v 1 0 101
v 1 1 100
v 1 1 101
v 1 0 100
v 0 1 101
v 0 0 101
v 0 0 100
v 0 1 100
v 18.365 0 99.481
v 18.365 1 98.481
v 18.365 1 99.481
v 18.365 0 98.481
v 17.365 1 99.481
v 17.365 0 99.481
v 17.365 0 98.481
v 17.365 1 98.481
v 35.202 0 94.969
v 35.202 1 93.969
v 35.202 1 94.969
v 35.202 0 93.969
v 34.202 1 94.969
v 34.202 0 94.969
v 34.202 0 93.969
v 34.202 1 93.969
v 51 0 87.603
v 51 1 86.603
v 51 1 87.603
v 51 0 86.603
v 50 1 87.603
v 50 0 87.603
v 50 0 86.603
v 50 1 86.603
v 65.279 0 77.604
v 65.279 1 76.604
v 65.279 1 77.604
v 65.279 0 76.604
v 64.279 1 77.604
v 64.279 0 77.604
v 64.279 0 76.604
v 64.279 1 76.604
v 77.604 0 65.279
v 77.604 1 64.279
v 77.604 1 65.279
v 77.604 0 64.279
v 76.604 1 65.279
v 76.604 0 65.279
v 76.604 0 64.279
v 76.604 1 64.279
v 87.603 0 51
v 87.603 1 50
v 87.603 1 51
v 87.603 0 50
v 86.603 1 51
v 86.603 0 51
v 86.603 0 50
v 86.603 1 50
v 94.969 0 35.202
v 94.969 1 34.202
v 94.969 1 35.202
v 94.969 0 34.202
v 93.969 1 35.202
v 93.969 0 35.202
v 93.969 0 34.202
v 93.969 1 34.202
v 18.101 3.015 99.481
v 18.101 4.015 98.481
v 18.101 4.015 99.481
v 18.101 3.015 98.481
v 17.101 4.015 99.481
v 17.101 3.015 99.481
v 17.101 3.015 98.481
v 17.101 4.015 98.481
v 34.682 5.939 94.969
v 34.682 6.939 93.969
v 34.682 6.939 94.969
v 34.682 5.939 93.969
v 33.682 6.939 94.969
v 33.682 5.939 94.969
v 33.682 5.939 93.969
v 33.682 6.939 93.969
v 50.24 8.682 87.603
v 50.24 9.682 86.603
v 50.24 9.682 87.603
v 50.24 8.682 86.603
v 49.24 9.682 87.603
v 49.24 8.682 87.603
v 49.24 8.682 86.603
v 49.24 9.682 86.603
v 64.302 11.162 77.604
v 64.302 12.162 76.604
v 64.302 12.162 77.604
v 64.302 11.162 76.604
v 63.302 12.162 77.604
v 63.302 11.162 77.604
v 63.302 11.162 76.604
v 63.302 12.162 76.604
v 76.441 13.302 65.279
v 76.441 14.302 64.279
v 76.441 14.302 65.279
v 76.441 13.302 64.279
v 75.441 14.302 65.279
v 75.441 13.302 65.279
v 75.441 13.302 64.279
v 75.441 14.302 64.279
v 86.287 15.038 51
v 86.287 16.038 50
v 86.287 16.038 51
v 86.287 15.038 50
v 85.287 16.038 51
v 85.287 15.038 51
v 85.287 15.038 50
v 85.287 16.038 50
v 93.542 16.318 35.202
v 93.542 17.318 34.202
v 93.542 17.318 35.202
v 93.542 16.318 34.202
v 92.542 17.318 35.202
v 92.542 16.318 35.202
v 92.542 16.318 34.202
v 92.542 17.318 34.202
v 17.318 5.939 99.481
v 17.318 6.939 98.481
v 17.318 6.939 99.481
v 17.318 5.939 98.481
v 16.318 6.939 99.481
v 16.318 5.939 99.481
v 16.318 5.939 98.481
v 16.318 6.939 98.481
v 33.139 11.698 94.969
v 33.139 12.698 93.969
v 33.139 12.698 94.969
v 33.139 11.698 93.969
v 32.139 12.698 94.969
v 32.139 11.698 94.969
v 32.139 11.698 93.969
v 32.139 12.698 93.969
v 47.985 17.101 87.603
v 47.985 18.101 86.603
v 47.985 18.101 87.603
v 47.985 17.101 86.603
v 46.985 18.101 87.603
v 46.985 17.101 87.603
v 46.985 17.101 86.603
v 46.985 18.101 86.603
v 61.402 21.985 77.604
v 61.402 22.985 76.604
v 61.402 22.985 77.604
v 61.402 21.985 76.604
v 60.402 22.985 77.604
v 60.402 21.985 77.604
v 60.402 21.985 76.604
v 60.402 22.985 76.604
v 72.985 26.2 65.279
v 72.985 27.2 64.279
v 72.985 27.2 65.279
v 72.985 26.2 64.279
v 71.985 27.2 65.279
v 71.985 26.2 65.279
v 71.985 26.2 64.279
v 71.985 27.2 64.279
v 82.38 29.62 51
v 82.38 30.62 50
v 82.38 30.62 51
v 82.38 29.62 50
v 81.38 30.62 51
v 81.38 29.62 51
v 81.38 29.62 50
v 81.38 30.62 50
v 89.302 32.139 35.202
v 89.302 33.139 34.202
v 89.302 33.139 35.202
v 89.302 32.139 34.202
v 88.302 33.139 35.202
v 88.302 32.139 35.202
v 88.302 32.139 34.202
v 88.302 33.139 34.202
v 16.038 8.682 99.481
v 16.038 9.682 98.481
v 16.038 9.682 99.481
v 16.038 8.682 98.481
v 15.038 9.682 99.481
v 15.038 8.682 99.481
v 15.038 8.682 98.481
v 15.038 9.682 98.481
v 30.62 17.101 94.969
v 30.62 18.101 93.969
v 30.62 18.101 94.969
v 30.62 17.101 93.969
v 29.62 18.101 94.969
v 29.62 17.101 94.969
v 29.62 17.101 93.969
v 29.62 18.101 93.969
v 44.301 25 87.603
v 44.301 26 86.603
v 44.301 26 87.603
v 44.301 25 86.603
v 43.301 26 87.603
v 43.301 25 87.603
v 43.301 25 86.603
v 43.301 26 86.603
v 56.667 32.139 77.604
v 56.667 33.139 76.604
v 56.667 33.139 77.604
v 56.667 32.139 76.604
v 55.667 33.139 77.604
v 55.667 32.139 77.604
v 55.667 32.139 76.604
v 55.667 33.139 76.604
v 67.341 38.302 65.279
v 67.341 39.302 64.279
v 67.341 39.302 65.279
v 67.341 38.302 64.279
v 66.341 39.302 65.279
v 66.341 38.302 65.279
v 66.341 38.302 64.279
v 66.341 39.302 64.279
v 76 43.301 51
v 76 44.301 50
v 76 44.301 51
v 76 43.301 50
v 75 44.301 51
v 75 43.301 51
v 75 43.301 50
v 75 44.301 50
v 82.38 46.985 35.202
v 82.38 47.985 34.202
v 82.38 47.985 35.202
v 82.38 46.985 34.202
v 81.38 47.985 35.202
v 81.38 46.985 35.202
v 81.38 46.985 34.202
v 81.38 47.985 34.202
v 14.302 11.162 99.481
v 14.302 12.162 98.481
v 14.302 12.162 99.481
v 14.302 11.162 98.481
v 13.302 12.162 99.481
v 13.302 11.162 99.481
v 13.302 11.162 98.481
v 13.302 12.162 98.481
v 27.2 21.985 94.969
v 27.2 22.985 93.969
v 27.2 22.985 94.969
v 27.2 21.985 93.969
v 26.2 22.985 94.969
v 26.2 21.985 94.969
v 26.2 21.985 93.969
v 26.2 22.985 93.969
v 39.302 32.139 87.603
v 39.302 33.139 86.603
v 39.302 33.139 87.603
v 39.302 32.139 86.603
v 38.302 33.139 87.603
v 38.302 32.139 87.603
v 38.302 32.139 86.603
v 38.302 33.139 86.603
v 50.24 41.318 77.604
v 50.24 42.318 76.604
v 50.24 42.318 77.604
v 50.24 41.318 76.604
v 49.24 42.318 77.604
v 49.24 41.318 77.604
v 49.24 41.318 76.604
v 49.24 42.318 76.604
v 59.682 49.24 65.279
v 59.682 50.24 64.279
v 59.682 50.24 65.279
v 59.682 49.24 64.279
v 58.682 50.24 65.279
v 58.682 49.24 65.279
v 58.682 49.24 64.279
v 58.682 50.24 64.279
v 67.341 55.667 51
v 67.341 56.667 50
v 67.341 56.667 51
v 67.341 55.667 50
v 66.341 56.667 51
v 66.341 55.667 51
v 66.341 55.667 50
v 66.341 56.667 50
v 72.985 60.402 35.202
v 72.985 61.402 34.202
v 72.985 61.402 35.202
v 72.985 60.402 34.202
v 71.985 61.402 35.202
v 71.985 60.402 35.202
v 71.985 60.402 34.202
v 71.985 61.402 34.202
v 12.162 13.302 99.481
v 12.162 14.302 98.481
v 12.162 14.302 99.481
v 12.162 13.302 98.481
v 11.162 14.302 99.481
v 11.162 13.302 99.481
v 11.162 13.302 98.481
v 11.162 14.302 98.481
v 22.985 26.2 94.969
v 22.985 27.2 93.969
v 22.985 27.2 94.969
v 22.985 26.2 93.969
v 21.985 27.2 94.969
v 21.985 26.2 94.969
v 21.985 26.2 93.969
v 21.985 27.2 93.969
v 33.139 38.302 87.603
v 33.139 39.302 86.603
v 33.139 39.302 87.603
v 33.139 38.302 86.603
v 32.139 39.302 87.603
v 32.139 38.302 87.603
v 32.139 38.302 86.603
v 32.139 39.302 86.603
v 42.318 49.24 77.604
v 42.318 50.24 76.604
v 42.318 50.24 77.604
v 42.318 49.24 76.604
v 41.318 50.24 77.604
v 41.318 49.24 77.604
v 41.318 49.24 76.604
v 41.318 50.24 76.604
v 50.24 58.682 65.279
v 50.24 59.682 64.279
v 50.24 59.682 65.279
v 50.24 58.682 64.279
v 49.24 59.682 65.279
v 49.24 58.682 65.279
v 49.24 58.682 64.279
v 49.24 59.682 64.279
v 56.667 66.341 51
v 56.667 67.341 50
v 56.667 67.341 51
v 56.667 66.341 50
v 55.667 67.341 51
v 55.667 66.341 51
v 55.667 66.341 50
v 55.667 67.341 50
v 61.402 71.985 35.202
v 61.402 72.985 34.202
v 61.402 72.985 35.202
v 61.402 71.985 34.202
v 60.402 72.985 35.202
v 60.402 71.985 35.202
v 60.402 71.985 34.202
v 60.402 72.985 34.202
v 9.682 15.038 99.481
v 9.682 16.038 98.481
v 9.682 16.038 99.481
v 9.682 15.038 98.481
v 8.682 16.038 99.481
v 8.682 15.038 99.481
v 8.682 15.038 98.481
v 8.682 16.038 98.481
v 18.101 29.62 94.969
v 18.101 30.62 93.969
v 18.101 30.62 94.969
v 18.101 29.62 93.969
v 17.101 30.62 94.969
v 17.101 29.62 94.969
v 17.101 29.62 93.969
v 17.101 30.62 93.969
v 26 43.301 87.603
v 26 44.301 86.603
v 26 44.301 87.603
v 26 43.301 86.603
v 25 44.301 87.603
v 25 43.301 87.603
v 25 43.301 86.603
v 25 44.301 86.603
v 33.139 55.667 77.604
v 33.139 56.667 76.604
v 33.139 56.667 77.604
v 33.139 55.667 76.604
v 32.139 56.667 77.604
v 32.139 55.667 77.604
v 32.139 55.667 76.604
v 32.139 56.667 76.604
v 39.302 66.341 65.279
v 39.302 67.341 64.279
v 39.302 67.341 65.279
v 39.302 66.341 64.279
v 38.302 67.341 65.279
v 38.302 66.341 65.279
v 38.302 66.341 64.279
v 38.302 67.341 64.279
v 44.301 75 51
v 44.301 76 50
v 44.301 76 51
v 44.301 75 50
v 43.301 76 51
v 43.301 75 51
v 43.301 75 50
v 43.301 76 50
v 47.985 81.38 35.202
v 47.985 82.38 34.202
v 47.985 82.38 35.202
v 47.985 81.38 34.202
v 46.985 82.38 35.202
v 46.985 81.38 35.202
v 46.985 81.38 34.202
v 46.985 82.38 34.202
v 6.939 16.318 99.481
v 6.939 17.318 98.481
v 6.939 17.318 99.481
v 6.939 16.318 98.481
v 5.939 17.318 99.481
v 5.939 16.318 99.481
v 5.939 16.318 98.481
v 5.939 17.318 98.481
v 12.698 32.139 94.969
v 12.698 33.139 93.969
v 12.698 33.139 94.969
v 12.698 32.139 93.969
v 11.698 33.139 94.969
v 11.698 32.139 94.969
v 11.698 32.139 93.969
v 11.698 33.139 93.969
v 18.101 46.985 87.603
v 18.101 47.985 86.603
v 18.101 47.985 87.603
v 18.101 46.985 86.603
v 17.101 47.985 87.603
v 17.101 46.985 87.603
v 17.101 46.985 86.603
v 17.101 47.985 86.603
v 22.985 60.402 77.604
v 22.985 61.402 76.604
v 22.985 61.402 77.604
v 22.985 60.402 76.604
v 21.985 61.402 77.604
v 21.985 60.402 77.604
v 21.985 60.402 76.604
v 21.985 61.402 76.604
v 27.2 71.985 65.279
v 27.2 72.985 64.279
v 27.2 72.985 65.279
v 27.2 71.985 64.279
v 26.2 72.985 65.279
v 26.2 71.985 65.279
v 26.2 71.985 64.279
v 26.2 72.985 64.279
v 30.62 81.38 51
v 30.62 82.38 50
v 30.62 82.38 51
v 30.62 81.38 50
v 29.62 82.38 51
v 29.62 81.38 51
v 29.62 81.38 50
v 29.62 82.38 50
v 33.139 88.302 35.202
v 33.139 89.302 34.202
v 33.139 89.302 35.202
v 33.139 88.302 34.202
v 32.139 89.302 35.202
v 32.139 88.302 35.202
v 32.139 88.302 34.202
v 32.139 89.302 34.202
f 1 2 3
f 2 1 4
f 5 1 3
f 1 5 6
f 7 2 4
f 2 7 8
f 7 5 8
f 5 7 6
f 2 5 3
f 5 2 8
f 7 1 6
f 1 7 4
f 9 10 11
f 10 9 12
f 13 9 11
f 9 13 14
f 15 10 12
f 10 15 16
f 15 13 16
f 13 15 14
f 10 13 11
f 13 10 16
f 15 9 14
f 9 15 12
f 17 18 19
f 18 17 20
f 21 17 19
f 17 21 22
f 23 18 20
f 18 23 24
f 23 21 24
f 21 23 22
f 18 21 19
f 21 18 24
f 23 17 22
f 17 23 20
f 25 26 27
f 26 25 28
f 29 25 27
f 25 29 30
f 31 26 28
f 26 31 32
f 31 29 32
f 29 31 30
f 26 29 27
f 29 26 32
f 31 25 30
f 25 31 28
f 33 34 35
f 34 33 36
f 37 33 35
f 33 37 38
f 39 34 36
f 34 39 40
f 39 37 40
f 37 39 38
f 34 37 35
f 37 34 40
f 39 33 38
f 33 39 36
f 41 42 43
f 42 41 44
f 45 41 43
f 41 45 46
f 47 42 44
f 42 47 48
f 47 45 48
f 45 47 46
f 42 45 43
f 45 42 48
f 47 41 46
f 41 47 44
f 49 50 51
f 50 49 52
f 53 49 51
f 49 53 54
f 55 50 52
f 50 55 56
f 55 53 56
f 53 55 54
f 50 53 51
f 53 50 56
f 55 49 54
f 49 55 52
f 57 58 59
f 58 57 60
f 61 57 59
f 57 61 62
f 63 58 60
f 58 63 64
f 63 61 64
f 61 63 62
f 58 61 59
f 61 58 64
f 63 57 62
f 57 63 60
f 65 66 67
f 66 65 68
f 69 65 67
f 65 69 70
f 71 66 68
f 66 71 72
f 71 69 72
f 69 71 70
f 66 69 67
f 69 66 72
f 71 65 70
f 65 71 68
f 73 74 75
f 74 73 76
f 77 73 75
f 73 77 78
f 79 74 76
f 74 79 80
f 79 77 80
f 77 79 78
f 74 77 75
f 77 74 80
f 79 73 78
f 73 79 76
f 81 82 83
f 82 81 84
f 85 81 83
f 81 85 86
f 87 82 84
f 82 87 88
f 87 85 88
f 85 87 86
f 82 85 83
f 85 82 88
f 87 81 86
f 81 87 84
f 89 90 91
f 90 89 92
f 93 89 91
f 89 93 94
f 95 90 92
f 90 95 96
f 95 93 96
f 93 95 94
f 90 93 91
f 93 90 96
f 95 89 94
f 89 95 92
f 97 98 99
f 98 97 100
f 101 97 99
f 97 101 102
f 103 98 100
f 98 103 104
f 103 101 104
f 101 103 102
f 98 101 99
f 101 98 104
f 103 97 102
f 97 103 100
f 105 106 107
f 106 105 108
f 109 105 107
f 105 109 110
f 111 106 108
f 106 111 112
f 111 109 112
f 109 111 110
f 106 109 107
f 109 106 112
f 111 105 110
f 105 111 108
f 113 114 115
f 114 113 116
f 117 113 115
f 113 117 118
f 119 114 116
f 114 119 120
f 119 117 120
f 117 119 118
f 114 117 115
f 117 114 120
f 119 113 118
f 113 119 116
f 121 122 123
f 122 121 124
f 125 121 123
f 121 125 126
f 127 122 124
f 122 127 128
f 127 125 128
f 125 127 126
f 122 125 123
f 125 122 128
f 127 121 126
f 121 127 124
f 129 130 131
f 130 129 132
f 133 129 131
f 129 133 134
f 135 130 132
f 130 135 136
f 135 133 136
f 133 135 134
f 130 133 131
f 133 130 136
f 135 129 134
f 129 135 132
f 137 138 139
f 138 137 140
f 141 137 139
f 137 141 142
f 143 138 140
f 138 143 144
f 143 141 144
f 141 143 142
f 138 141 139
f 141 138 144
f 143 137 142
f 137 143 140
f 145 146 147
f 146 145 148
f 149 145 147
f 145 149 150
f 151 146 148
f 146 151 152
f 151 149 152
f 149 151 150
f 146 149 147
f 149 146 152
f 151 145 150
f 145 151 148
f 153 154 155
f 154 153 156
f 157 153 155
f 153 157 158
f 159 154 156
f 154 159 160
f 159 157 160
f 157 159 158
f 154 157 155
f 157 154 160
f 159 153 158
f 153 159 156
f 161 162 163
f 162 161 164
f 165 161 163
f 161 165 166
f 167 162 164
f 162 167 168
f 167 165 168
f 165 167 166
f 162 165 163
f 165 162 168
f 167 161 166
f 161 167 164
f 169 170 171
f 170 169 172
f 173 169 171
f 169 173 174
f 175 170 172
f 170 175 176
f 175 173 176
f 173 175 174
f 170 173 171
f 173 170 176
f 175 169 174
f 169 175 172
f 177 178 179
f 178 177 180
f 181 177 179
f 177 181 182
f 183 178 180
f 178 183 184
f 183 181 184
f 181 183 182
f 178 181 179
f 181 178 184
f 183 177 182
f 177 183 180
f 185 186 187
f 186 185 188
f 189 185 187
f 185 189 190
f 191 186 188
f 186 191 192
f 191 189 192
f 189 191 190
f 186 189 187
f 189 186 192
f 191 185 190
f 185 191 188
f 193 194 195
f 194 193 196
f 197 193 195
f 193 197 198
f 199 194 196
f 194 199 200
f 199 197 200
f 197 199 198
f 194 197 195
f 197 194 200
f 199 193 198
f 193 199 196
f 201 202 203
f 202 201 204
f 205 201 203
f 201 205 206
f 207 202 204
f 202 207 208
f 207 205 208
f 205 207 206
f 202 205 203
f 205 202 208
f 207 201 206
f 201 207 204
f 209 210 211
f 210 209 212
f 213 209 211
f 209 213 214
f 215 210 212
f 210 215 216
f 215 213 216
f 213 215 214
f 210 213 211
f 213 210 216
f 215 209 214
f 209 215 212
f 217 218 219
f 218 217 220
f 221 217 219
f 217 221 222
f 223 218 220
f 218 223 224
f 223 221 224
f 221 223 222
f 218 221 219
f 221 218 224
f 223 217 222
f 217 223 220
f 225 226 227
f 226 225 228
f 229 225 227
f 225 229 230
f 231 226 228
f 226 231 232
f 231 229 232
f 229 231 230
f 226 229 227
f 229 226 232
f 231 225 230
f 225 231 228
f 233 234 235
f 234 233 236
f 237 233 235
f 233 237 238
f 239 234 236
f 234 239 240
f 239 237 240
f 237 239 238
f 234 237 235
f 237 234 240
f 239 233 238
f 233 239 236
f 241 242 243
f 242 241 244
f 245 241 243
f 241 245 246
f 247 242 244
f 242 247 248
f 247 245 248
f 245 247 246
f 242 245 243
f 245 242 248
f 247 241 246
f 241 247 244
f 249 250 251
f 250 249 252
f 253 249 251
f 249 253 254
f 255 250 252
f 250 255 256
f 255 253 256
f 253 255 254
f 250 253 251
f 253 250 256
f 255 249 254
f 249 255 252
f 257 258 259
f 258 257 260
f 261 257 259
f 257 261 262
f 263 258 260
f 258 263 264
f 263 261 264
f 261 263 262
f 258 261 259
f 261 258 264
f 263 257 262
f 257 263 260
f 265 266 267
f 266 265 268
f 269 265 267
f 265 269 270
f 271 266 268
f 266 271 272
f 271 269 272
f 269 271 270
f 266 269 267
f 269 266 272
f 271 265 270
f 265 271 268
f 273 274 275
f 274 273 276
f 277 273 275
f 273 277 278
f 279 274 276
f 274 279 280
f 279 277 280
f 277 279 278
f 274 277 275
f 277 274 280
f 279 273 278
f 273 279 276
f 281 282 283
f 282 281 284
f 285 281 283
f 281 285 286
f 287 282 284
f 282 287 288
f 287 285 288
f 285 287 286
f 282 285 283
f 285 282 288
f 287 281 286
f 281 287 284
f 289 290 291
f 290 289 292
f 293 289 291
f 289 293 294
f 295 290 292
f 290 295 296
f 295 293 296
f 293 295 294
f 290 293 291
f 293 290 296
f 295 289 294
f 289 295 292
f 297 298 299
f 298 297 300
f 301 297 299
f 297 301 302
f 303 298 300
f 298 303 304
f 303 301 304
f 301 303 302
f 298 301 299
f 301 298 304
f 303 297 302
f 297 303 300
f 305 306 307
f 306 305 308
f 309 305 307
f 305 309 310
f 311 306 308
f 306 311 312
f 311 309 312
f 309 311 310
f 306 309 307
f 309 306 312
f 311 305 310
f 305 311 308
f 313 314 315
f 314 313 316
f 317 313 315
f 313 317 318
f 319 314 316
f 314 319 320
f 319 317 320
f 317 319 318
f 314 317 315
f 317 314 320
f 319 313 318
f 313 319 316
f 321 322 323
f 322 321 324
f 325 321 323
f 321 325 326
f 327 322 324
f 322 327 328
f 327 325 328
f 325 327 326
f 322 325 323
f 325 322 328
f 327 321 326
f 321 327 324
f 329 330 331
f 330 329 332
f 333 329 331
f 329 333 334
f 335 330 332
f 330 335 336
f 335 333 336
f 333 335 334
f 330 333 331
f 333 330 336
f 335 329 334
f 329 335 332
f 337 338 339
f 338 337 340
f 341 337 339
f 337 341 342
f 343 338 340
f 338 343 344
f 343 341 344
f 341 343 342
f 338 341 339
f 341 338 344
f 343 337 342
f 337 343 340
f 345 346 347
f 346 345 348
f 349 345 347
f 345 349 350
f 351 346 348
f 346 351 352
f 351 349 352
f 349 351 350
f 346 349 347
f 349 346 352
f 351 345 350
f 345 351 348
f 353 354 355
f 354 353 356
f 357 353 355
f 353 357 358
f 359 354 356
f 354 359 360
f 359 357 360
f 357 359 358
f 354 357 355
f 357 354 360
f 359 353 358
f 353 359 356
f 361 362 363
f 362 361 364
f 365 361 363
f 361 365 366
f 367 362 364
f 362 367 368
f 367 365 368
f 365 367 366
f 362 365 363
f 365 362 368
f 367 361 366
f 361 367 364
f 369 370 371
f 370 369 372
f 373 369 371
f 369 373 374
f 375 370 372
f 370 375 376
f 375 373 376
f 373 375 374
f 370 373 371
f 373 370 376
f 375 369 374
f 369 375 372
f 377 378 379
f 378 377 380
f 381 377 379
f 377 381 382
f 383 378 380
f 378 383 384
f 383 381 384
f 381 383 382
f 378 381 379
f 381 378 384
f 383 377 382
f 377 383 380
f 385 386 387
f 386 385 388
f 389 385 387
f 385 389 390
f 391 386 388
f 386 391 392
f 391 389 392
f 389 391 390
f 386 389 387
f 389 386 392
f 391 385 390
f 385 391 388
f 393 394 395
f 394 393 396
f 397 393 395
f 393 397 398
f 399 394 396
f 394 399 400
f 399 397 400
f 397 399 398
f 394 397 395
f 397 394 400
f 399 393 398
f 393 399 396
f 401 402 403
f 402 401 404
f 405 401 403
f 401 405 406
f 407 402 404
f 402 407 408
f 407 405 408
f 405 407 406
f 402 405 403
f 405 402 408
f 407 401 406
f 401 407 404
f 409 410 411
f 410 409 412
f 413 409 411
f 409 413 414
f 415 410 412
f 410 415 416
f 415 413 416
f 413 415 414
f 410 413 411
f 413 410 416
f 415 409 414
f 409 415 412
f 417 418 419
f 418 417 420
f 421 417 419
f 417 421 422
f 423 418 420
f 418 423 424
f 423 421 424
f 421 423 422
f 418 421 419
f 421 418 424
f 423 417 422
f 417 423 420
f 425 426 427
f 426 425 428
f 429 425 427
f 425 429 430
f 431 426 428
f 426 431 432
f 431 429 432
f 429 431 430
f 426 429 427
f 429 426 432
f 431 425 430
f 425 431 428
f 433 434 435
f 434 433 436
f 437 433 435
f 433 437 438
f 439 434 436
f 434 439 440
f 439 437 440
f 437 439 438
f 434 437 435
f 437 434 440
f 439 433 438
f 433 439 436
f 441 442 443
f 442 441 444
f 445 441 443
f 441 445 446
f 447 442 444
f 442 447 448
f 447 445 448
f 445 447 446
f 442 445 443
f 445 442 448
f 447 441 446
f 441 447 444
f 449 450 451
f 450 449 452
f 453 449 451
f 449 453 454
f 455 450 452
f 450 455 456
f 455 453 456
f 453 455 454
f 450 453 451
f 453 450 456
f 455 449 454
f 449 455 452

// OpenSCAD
// Given an [x,y] or [x,y,z], transform to a
// [rho, theta] or [rho, theta, phi].
// Note that in mathematical spherical coordinates,
// phi is measured down from vertical.  This is as
// opposed to geographic coordinates, where latitude
// is measured up from the equator.
function topolar(p) =
    len(p) == 3 ? topolar3(p) : topolar2(p);

function topolar2(p) = [
    norm(p),
    atan2(p.y, p.x)
];

function topolar3(p) = [
    norm(p),
    atan2(p.y, p.x),
    atan2(norm([p.x,p.y]), p.z)
];

// Given a [rho, theta] or [rho, theta, phi], transform to
// an [x,y] or [x,y,z].
function torect(p) =
    len(p) == 3 ? torect3(p) : torect2(p);

function torect2(p) = [
    p[0] * cos(p[1]),
    p[0] * sin(p[1])
];

function torect3(p) = [
    p[0] * cos(p[1]) * sin(p[2]),
    p[0] * sin(p[1]) * sin(p[2]),
    p[0] * cos(p[2])
];

echo(topolar([10,0]));
echo(topolar([10,1]));
echo(topolar([10,10]));
echo(topolar([-10,10]));
echo(topolar([-10,-10]));
echo(topolar([10,-10]));
echo();
echo(topolar([10,0,0]));
echo(topolar([10,1,0]));
echo(topolar([10,10,10]));
echo(topolar([-10,10,10]));
echo(topolar([-10,-10,10]));
echo(topolar([10,-10,10]));
echo();

rho = 100;
for (theta = [0:10:70]) for (phi=[0:10:70]) translate(torect([rho, theta, phi])) cube(1);
